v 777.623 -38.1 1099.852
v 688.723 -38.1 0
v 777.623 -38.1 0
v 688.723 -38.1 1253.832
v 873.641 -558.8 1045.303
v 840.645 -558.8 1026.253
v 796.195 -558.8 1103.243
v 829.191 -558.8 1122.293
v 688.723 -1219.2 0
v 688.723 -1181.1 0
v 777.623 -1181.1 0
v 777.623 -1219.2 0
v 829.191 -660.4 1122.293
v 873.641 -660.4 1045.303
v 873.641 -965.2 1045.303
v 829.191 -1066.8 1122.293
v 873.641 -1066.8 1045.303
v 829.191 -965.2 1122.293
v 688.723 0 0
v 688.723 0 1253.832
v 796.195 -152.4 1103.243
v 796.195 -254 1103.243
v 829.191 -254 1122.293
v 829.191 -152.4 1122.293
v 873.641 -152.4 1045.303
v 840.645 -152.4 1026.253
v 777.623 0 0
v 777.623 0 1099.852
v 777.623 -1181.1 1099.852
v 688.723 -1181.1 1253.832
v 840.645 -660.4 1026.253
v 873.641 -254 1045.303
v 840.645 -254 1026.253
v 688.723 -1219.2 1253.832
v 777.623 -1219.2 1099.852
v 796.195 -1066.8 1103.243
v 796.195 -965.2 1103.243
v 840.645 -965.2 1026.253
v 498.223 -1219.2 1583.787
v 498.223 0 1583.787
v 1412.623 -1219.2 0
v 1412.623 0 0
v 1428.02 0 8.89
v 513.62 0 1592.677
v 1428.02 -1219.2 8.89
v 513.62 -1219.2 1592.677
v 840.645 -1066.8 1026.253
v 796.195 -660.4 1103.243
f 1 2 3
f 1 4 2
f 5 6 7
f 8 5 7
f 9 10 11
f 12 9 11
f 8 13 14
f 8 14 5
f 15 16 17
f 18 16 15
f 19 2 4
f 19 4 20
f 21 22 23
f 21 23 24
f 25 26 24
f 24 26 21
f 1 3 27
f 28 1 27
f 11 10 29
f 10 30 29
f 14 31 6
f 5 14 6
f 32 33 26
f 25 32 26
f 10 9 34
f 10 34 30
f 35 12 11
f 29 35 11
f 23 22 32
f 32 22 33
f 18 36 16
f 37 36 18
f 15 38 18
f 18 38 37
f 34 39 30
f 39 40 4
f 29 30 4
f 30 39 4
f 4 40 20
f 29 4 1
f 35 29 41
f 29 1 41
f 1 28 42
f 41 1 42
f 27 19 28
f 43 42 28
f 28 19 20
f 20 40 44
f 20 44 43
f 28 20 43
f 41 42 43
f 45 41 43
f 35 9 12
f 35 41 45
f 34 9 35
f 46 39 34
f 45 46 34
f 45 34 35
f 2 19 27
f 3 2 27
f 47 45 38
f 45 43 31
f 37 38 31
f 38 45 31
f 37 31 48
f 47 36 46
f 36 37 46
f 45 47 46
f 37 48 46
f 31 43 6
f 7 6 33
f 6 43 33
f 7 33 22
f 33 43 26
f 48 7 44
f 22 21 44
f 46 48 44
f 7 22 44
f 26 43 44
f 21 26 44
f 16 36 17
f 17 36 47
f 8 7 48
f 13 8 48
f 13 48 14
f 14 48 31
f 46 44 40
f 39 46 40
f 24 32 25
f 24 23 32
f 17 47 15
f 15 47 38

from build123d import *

# Parameters (mm, degrees)
F1_DEPTH = 1219.2
F2_DEPTH = 1219.2
F3_W     = 88.9
F3_H     = 38.1
F6_W     = 101.6
F6_H     = 44.45
F6_W_2   = 50.8
F7_DEPTH = 38.1


# Not quite as in the source:
# - a feature of the source that left no trace in its solid (it failed there, or was rolled back) is left out


with BuildPart() as f1:
    # F0 (on Front) → F1 (new body)
    with BuildSketch(Plane.XZ):
        Polygon((1412.622521745, 0), (1428.0204534243, 8.89), (818.4204534243, 1064.748172294), (803.022521745, 1055.858172294), align=None)
    extrude(amount=F1_DEPTH)

    # F0 (on Front) → F2 (join, through all)
    with BuildSketch(Plane.XZ):
        Polygon((803.022521745, 1055.858172294), (818.4204534243, 1064.748172294), (513.6204534243, 1592.677258441), (498.222521745, 1583.787258441), align=None)
    extrude(amount=F2_DEPTH)

    # F3 (on Top) → F5 (join, up to the next surface of F1)
    with BuildSketch(Plane.XY):
        with Locations((733.172521745, -19.05)):
            Rectangle(F3_W, F3_H)
        with Locations((733.172521745, -1200.15)):
            Rectangle(F3_W, F3_H)
    extrude(until=Until.NEXT)

    # F6 (on face) → F7 (join)
    with BuildSketch(Plane(origin=(1074.864822988, 0, 620.5734948946), x_dir=(0, 1, 0), z_dir=(0.8660254038, 0, 0.5))):
        with Locations((-203.2, 490.6637391275)):
            Rectangle(F6_W, F6_H)
        with Locations((-203.2, 535.1137391275)):
            Rectangle(F6_W, F6_H)
        with Locations((-1016, 490.6637391275)):
            Rectangle(F6_W, F6_H)
        with Locations((-1016, 535.1137391275)):
            Rectangle(F6_W, F6_H)
        Polygon((-558.8, 468.4387391275), (-558.8, 512.8887391275), (-609.6, 512.8887391275), (-660.4, 512.8887391275), (-660.4, 468.4387391275), align=None)
        with Locations((-584.2, 535.1137391275)):
            Rectangle(F6_W_2, F6_H)
        with Locations((-635, 535.1137391275)):
            Rectangle(F6_W_2, F6_H)
    extrude(amount=F7_DEPTH)


solid = f1.part
